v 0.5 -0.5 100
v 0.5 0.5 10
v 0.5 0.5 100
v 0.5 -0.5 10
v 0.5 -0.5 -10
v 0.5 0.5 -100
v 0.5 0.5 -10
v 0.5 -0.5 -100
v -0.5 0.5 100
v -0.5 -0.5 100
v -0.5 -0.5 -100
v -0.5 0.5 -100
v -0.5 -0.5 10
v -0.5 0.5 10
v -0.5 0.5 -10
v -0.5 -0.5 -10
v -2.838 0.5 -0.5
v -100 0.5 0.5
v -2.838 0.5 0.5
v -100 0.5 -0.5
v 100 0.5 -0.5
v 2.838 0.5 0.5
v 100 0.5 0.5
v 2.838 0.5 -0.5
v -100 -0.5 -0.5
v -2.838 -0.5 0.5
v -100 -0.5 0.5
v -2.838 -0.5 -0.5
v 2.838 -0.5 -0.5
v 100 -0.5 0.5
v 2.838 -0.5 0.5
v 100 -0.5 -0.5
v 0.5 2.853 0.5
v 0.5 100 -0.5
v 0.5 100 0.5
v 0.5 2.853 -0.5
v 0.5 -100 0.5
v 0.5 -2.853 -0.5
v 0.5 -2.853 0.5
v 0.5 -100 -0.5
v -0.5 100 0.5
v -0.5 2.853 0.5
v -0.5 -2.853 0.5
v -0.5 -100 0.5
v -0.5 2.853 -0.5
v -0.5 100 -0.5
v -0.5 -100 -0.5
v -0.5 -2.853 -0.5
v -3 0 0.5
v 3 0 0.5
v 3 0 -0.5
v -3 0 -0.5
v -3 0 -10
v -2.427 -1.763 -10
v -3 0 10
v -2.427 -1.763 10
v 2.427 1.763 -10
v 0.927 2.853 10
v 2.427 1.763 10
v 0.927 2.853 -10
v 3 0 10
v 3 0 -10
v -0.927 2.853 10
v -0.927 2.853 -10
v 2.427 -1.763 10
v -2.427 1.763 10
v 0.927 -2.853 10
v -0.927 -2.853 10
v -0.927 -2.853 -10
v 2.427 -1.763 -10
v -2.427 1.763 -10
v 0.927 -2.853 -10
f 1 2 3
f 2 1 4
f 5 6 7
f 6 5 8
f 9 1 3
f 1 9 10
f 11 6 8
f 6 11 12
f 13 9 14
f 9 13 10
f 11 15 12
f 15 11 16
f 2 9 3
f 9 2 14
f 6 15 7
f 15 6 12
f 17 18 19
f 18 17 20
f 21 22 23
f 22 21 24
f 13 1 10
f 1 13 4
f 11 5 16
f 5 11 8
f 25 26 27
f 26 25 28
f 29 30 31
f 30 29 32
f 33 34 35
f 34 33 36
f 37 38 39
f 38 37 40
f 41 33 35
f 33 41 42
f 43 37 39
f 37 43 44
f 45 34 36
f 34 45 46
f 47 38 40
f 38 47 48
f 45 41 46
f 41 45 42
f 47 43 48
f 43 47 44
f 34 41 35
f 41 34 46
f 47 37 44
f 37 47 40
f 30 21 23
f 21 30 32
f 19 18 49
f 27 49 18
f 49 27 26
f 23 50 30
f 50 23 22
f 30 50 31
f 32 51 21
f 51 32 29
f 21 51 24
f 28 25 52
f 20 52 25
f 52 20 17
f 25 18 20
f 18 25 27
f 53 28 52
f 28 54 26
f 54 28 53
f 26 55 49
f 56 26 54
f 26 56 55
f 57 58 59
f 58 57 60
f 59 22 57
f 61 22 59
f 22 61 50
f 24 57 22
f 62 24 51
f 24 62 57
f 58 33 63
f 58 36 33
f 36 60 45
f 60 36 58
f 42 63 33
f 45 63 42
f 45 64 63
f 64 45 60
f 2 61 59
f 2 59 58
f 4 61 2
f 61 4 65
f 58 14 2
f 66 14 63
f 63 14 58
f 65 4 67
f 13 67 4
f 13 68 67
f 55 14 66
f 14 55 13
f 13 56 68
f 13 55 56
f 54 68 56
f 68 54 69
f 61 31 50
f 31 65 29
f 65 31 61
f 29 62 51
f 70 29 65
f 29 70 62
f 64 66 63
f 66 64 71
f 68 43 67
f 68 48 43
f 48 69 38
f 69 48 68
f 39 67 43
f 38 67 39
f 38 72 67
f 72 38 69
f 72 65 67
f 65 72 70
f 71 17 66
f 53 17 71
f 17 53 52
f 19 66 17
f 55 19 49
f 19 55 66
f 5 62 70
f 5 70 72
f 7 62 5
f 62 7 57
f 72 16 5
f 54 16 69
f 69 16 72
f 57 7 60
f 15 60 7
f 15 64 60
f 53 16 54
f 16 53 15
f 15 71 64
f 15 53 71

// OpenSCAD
// axis
cube([1,1,200],center=true);
cube([1,200,1],center=true);
cube([200,1,1],center=true);

cylinder(h=20,r=3,center=true);
